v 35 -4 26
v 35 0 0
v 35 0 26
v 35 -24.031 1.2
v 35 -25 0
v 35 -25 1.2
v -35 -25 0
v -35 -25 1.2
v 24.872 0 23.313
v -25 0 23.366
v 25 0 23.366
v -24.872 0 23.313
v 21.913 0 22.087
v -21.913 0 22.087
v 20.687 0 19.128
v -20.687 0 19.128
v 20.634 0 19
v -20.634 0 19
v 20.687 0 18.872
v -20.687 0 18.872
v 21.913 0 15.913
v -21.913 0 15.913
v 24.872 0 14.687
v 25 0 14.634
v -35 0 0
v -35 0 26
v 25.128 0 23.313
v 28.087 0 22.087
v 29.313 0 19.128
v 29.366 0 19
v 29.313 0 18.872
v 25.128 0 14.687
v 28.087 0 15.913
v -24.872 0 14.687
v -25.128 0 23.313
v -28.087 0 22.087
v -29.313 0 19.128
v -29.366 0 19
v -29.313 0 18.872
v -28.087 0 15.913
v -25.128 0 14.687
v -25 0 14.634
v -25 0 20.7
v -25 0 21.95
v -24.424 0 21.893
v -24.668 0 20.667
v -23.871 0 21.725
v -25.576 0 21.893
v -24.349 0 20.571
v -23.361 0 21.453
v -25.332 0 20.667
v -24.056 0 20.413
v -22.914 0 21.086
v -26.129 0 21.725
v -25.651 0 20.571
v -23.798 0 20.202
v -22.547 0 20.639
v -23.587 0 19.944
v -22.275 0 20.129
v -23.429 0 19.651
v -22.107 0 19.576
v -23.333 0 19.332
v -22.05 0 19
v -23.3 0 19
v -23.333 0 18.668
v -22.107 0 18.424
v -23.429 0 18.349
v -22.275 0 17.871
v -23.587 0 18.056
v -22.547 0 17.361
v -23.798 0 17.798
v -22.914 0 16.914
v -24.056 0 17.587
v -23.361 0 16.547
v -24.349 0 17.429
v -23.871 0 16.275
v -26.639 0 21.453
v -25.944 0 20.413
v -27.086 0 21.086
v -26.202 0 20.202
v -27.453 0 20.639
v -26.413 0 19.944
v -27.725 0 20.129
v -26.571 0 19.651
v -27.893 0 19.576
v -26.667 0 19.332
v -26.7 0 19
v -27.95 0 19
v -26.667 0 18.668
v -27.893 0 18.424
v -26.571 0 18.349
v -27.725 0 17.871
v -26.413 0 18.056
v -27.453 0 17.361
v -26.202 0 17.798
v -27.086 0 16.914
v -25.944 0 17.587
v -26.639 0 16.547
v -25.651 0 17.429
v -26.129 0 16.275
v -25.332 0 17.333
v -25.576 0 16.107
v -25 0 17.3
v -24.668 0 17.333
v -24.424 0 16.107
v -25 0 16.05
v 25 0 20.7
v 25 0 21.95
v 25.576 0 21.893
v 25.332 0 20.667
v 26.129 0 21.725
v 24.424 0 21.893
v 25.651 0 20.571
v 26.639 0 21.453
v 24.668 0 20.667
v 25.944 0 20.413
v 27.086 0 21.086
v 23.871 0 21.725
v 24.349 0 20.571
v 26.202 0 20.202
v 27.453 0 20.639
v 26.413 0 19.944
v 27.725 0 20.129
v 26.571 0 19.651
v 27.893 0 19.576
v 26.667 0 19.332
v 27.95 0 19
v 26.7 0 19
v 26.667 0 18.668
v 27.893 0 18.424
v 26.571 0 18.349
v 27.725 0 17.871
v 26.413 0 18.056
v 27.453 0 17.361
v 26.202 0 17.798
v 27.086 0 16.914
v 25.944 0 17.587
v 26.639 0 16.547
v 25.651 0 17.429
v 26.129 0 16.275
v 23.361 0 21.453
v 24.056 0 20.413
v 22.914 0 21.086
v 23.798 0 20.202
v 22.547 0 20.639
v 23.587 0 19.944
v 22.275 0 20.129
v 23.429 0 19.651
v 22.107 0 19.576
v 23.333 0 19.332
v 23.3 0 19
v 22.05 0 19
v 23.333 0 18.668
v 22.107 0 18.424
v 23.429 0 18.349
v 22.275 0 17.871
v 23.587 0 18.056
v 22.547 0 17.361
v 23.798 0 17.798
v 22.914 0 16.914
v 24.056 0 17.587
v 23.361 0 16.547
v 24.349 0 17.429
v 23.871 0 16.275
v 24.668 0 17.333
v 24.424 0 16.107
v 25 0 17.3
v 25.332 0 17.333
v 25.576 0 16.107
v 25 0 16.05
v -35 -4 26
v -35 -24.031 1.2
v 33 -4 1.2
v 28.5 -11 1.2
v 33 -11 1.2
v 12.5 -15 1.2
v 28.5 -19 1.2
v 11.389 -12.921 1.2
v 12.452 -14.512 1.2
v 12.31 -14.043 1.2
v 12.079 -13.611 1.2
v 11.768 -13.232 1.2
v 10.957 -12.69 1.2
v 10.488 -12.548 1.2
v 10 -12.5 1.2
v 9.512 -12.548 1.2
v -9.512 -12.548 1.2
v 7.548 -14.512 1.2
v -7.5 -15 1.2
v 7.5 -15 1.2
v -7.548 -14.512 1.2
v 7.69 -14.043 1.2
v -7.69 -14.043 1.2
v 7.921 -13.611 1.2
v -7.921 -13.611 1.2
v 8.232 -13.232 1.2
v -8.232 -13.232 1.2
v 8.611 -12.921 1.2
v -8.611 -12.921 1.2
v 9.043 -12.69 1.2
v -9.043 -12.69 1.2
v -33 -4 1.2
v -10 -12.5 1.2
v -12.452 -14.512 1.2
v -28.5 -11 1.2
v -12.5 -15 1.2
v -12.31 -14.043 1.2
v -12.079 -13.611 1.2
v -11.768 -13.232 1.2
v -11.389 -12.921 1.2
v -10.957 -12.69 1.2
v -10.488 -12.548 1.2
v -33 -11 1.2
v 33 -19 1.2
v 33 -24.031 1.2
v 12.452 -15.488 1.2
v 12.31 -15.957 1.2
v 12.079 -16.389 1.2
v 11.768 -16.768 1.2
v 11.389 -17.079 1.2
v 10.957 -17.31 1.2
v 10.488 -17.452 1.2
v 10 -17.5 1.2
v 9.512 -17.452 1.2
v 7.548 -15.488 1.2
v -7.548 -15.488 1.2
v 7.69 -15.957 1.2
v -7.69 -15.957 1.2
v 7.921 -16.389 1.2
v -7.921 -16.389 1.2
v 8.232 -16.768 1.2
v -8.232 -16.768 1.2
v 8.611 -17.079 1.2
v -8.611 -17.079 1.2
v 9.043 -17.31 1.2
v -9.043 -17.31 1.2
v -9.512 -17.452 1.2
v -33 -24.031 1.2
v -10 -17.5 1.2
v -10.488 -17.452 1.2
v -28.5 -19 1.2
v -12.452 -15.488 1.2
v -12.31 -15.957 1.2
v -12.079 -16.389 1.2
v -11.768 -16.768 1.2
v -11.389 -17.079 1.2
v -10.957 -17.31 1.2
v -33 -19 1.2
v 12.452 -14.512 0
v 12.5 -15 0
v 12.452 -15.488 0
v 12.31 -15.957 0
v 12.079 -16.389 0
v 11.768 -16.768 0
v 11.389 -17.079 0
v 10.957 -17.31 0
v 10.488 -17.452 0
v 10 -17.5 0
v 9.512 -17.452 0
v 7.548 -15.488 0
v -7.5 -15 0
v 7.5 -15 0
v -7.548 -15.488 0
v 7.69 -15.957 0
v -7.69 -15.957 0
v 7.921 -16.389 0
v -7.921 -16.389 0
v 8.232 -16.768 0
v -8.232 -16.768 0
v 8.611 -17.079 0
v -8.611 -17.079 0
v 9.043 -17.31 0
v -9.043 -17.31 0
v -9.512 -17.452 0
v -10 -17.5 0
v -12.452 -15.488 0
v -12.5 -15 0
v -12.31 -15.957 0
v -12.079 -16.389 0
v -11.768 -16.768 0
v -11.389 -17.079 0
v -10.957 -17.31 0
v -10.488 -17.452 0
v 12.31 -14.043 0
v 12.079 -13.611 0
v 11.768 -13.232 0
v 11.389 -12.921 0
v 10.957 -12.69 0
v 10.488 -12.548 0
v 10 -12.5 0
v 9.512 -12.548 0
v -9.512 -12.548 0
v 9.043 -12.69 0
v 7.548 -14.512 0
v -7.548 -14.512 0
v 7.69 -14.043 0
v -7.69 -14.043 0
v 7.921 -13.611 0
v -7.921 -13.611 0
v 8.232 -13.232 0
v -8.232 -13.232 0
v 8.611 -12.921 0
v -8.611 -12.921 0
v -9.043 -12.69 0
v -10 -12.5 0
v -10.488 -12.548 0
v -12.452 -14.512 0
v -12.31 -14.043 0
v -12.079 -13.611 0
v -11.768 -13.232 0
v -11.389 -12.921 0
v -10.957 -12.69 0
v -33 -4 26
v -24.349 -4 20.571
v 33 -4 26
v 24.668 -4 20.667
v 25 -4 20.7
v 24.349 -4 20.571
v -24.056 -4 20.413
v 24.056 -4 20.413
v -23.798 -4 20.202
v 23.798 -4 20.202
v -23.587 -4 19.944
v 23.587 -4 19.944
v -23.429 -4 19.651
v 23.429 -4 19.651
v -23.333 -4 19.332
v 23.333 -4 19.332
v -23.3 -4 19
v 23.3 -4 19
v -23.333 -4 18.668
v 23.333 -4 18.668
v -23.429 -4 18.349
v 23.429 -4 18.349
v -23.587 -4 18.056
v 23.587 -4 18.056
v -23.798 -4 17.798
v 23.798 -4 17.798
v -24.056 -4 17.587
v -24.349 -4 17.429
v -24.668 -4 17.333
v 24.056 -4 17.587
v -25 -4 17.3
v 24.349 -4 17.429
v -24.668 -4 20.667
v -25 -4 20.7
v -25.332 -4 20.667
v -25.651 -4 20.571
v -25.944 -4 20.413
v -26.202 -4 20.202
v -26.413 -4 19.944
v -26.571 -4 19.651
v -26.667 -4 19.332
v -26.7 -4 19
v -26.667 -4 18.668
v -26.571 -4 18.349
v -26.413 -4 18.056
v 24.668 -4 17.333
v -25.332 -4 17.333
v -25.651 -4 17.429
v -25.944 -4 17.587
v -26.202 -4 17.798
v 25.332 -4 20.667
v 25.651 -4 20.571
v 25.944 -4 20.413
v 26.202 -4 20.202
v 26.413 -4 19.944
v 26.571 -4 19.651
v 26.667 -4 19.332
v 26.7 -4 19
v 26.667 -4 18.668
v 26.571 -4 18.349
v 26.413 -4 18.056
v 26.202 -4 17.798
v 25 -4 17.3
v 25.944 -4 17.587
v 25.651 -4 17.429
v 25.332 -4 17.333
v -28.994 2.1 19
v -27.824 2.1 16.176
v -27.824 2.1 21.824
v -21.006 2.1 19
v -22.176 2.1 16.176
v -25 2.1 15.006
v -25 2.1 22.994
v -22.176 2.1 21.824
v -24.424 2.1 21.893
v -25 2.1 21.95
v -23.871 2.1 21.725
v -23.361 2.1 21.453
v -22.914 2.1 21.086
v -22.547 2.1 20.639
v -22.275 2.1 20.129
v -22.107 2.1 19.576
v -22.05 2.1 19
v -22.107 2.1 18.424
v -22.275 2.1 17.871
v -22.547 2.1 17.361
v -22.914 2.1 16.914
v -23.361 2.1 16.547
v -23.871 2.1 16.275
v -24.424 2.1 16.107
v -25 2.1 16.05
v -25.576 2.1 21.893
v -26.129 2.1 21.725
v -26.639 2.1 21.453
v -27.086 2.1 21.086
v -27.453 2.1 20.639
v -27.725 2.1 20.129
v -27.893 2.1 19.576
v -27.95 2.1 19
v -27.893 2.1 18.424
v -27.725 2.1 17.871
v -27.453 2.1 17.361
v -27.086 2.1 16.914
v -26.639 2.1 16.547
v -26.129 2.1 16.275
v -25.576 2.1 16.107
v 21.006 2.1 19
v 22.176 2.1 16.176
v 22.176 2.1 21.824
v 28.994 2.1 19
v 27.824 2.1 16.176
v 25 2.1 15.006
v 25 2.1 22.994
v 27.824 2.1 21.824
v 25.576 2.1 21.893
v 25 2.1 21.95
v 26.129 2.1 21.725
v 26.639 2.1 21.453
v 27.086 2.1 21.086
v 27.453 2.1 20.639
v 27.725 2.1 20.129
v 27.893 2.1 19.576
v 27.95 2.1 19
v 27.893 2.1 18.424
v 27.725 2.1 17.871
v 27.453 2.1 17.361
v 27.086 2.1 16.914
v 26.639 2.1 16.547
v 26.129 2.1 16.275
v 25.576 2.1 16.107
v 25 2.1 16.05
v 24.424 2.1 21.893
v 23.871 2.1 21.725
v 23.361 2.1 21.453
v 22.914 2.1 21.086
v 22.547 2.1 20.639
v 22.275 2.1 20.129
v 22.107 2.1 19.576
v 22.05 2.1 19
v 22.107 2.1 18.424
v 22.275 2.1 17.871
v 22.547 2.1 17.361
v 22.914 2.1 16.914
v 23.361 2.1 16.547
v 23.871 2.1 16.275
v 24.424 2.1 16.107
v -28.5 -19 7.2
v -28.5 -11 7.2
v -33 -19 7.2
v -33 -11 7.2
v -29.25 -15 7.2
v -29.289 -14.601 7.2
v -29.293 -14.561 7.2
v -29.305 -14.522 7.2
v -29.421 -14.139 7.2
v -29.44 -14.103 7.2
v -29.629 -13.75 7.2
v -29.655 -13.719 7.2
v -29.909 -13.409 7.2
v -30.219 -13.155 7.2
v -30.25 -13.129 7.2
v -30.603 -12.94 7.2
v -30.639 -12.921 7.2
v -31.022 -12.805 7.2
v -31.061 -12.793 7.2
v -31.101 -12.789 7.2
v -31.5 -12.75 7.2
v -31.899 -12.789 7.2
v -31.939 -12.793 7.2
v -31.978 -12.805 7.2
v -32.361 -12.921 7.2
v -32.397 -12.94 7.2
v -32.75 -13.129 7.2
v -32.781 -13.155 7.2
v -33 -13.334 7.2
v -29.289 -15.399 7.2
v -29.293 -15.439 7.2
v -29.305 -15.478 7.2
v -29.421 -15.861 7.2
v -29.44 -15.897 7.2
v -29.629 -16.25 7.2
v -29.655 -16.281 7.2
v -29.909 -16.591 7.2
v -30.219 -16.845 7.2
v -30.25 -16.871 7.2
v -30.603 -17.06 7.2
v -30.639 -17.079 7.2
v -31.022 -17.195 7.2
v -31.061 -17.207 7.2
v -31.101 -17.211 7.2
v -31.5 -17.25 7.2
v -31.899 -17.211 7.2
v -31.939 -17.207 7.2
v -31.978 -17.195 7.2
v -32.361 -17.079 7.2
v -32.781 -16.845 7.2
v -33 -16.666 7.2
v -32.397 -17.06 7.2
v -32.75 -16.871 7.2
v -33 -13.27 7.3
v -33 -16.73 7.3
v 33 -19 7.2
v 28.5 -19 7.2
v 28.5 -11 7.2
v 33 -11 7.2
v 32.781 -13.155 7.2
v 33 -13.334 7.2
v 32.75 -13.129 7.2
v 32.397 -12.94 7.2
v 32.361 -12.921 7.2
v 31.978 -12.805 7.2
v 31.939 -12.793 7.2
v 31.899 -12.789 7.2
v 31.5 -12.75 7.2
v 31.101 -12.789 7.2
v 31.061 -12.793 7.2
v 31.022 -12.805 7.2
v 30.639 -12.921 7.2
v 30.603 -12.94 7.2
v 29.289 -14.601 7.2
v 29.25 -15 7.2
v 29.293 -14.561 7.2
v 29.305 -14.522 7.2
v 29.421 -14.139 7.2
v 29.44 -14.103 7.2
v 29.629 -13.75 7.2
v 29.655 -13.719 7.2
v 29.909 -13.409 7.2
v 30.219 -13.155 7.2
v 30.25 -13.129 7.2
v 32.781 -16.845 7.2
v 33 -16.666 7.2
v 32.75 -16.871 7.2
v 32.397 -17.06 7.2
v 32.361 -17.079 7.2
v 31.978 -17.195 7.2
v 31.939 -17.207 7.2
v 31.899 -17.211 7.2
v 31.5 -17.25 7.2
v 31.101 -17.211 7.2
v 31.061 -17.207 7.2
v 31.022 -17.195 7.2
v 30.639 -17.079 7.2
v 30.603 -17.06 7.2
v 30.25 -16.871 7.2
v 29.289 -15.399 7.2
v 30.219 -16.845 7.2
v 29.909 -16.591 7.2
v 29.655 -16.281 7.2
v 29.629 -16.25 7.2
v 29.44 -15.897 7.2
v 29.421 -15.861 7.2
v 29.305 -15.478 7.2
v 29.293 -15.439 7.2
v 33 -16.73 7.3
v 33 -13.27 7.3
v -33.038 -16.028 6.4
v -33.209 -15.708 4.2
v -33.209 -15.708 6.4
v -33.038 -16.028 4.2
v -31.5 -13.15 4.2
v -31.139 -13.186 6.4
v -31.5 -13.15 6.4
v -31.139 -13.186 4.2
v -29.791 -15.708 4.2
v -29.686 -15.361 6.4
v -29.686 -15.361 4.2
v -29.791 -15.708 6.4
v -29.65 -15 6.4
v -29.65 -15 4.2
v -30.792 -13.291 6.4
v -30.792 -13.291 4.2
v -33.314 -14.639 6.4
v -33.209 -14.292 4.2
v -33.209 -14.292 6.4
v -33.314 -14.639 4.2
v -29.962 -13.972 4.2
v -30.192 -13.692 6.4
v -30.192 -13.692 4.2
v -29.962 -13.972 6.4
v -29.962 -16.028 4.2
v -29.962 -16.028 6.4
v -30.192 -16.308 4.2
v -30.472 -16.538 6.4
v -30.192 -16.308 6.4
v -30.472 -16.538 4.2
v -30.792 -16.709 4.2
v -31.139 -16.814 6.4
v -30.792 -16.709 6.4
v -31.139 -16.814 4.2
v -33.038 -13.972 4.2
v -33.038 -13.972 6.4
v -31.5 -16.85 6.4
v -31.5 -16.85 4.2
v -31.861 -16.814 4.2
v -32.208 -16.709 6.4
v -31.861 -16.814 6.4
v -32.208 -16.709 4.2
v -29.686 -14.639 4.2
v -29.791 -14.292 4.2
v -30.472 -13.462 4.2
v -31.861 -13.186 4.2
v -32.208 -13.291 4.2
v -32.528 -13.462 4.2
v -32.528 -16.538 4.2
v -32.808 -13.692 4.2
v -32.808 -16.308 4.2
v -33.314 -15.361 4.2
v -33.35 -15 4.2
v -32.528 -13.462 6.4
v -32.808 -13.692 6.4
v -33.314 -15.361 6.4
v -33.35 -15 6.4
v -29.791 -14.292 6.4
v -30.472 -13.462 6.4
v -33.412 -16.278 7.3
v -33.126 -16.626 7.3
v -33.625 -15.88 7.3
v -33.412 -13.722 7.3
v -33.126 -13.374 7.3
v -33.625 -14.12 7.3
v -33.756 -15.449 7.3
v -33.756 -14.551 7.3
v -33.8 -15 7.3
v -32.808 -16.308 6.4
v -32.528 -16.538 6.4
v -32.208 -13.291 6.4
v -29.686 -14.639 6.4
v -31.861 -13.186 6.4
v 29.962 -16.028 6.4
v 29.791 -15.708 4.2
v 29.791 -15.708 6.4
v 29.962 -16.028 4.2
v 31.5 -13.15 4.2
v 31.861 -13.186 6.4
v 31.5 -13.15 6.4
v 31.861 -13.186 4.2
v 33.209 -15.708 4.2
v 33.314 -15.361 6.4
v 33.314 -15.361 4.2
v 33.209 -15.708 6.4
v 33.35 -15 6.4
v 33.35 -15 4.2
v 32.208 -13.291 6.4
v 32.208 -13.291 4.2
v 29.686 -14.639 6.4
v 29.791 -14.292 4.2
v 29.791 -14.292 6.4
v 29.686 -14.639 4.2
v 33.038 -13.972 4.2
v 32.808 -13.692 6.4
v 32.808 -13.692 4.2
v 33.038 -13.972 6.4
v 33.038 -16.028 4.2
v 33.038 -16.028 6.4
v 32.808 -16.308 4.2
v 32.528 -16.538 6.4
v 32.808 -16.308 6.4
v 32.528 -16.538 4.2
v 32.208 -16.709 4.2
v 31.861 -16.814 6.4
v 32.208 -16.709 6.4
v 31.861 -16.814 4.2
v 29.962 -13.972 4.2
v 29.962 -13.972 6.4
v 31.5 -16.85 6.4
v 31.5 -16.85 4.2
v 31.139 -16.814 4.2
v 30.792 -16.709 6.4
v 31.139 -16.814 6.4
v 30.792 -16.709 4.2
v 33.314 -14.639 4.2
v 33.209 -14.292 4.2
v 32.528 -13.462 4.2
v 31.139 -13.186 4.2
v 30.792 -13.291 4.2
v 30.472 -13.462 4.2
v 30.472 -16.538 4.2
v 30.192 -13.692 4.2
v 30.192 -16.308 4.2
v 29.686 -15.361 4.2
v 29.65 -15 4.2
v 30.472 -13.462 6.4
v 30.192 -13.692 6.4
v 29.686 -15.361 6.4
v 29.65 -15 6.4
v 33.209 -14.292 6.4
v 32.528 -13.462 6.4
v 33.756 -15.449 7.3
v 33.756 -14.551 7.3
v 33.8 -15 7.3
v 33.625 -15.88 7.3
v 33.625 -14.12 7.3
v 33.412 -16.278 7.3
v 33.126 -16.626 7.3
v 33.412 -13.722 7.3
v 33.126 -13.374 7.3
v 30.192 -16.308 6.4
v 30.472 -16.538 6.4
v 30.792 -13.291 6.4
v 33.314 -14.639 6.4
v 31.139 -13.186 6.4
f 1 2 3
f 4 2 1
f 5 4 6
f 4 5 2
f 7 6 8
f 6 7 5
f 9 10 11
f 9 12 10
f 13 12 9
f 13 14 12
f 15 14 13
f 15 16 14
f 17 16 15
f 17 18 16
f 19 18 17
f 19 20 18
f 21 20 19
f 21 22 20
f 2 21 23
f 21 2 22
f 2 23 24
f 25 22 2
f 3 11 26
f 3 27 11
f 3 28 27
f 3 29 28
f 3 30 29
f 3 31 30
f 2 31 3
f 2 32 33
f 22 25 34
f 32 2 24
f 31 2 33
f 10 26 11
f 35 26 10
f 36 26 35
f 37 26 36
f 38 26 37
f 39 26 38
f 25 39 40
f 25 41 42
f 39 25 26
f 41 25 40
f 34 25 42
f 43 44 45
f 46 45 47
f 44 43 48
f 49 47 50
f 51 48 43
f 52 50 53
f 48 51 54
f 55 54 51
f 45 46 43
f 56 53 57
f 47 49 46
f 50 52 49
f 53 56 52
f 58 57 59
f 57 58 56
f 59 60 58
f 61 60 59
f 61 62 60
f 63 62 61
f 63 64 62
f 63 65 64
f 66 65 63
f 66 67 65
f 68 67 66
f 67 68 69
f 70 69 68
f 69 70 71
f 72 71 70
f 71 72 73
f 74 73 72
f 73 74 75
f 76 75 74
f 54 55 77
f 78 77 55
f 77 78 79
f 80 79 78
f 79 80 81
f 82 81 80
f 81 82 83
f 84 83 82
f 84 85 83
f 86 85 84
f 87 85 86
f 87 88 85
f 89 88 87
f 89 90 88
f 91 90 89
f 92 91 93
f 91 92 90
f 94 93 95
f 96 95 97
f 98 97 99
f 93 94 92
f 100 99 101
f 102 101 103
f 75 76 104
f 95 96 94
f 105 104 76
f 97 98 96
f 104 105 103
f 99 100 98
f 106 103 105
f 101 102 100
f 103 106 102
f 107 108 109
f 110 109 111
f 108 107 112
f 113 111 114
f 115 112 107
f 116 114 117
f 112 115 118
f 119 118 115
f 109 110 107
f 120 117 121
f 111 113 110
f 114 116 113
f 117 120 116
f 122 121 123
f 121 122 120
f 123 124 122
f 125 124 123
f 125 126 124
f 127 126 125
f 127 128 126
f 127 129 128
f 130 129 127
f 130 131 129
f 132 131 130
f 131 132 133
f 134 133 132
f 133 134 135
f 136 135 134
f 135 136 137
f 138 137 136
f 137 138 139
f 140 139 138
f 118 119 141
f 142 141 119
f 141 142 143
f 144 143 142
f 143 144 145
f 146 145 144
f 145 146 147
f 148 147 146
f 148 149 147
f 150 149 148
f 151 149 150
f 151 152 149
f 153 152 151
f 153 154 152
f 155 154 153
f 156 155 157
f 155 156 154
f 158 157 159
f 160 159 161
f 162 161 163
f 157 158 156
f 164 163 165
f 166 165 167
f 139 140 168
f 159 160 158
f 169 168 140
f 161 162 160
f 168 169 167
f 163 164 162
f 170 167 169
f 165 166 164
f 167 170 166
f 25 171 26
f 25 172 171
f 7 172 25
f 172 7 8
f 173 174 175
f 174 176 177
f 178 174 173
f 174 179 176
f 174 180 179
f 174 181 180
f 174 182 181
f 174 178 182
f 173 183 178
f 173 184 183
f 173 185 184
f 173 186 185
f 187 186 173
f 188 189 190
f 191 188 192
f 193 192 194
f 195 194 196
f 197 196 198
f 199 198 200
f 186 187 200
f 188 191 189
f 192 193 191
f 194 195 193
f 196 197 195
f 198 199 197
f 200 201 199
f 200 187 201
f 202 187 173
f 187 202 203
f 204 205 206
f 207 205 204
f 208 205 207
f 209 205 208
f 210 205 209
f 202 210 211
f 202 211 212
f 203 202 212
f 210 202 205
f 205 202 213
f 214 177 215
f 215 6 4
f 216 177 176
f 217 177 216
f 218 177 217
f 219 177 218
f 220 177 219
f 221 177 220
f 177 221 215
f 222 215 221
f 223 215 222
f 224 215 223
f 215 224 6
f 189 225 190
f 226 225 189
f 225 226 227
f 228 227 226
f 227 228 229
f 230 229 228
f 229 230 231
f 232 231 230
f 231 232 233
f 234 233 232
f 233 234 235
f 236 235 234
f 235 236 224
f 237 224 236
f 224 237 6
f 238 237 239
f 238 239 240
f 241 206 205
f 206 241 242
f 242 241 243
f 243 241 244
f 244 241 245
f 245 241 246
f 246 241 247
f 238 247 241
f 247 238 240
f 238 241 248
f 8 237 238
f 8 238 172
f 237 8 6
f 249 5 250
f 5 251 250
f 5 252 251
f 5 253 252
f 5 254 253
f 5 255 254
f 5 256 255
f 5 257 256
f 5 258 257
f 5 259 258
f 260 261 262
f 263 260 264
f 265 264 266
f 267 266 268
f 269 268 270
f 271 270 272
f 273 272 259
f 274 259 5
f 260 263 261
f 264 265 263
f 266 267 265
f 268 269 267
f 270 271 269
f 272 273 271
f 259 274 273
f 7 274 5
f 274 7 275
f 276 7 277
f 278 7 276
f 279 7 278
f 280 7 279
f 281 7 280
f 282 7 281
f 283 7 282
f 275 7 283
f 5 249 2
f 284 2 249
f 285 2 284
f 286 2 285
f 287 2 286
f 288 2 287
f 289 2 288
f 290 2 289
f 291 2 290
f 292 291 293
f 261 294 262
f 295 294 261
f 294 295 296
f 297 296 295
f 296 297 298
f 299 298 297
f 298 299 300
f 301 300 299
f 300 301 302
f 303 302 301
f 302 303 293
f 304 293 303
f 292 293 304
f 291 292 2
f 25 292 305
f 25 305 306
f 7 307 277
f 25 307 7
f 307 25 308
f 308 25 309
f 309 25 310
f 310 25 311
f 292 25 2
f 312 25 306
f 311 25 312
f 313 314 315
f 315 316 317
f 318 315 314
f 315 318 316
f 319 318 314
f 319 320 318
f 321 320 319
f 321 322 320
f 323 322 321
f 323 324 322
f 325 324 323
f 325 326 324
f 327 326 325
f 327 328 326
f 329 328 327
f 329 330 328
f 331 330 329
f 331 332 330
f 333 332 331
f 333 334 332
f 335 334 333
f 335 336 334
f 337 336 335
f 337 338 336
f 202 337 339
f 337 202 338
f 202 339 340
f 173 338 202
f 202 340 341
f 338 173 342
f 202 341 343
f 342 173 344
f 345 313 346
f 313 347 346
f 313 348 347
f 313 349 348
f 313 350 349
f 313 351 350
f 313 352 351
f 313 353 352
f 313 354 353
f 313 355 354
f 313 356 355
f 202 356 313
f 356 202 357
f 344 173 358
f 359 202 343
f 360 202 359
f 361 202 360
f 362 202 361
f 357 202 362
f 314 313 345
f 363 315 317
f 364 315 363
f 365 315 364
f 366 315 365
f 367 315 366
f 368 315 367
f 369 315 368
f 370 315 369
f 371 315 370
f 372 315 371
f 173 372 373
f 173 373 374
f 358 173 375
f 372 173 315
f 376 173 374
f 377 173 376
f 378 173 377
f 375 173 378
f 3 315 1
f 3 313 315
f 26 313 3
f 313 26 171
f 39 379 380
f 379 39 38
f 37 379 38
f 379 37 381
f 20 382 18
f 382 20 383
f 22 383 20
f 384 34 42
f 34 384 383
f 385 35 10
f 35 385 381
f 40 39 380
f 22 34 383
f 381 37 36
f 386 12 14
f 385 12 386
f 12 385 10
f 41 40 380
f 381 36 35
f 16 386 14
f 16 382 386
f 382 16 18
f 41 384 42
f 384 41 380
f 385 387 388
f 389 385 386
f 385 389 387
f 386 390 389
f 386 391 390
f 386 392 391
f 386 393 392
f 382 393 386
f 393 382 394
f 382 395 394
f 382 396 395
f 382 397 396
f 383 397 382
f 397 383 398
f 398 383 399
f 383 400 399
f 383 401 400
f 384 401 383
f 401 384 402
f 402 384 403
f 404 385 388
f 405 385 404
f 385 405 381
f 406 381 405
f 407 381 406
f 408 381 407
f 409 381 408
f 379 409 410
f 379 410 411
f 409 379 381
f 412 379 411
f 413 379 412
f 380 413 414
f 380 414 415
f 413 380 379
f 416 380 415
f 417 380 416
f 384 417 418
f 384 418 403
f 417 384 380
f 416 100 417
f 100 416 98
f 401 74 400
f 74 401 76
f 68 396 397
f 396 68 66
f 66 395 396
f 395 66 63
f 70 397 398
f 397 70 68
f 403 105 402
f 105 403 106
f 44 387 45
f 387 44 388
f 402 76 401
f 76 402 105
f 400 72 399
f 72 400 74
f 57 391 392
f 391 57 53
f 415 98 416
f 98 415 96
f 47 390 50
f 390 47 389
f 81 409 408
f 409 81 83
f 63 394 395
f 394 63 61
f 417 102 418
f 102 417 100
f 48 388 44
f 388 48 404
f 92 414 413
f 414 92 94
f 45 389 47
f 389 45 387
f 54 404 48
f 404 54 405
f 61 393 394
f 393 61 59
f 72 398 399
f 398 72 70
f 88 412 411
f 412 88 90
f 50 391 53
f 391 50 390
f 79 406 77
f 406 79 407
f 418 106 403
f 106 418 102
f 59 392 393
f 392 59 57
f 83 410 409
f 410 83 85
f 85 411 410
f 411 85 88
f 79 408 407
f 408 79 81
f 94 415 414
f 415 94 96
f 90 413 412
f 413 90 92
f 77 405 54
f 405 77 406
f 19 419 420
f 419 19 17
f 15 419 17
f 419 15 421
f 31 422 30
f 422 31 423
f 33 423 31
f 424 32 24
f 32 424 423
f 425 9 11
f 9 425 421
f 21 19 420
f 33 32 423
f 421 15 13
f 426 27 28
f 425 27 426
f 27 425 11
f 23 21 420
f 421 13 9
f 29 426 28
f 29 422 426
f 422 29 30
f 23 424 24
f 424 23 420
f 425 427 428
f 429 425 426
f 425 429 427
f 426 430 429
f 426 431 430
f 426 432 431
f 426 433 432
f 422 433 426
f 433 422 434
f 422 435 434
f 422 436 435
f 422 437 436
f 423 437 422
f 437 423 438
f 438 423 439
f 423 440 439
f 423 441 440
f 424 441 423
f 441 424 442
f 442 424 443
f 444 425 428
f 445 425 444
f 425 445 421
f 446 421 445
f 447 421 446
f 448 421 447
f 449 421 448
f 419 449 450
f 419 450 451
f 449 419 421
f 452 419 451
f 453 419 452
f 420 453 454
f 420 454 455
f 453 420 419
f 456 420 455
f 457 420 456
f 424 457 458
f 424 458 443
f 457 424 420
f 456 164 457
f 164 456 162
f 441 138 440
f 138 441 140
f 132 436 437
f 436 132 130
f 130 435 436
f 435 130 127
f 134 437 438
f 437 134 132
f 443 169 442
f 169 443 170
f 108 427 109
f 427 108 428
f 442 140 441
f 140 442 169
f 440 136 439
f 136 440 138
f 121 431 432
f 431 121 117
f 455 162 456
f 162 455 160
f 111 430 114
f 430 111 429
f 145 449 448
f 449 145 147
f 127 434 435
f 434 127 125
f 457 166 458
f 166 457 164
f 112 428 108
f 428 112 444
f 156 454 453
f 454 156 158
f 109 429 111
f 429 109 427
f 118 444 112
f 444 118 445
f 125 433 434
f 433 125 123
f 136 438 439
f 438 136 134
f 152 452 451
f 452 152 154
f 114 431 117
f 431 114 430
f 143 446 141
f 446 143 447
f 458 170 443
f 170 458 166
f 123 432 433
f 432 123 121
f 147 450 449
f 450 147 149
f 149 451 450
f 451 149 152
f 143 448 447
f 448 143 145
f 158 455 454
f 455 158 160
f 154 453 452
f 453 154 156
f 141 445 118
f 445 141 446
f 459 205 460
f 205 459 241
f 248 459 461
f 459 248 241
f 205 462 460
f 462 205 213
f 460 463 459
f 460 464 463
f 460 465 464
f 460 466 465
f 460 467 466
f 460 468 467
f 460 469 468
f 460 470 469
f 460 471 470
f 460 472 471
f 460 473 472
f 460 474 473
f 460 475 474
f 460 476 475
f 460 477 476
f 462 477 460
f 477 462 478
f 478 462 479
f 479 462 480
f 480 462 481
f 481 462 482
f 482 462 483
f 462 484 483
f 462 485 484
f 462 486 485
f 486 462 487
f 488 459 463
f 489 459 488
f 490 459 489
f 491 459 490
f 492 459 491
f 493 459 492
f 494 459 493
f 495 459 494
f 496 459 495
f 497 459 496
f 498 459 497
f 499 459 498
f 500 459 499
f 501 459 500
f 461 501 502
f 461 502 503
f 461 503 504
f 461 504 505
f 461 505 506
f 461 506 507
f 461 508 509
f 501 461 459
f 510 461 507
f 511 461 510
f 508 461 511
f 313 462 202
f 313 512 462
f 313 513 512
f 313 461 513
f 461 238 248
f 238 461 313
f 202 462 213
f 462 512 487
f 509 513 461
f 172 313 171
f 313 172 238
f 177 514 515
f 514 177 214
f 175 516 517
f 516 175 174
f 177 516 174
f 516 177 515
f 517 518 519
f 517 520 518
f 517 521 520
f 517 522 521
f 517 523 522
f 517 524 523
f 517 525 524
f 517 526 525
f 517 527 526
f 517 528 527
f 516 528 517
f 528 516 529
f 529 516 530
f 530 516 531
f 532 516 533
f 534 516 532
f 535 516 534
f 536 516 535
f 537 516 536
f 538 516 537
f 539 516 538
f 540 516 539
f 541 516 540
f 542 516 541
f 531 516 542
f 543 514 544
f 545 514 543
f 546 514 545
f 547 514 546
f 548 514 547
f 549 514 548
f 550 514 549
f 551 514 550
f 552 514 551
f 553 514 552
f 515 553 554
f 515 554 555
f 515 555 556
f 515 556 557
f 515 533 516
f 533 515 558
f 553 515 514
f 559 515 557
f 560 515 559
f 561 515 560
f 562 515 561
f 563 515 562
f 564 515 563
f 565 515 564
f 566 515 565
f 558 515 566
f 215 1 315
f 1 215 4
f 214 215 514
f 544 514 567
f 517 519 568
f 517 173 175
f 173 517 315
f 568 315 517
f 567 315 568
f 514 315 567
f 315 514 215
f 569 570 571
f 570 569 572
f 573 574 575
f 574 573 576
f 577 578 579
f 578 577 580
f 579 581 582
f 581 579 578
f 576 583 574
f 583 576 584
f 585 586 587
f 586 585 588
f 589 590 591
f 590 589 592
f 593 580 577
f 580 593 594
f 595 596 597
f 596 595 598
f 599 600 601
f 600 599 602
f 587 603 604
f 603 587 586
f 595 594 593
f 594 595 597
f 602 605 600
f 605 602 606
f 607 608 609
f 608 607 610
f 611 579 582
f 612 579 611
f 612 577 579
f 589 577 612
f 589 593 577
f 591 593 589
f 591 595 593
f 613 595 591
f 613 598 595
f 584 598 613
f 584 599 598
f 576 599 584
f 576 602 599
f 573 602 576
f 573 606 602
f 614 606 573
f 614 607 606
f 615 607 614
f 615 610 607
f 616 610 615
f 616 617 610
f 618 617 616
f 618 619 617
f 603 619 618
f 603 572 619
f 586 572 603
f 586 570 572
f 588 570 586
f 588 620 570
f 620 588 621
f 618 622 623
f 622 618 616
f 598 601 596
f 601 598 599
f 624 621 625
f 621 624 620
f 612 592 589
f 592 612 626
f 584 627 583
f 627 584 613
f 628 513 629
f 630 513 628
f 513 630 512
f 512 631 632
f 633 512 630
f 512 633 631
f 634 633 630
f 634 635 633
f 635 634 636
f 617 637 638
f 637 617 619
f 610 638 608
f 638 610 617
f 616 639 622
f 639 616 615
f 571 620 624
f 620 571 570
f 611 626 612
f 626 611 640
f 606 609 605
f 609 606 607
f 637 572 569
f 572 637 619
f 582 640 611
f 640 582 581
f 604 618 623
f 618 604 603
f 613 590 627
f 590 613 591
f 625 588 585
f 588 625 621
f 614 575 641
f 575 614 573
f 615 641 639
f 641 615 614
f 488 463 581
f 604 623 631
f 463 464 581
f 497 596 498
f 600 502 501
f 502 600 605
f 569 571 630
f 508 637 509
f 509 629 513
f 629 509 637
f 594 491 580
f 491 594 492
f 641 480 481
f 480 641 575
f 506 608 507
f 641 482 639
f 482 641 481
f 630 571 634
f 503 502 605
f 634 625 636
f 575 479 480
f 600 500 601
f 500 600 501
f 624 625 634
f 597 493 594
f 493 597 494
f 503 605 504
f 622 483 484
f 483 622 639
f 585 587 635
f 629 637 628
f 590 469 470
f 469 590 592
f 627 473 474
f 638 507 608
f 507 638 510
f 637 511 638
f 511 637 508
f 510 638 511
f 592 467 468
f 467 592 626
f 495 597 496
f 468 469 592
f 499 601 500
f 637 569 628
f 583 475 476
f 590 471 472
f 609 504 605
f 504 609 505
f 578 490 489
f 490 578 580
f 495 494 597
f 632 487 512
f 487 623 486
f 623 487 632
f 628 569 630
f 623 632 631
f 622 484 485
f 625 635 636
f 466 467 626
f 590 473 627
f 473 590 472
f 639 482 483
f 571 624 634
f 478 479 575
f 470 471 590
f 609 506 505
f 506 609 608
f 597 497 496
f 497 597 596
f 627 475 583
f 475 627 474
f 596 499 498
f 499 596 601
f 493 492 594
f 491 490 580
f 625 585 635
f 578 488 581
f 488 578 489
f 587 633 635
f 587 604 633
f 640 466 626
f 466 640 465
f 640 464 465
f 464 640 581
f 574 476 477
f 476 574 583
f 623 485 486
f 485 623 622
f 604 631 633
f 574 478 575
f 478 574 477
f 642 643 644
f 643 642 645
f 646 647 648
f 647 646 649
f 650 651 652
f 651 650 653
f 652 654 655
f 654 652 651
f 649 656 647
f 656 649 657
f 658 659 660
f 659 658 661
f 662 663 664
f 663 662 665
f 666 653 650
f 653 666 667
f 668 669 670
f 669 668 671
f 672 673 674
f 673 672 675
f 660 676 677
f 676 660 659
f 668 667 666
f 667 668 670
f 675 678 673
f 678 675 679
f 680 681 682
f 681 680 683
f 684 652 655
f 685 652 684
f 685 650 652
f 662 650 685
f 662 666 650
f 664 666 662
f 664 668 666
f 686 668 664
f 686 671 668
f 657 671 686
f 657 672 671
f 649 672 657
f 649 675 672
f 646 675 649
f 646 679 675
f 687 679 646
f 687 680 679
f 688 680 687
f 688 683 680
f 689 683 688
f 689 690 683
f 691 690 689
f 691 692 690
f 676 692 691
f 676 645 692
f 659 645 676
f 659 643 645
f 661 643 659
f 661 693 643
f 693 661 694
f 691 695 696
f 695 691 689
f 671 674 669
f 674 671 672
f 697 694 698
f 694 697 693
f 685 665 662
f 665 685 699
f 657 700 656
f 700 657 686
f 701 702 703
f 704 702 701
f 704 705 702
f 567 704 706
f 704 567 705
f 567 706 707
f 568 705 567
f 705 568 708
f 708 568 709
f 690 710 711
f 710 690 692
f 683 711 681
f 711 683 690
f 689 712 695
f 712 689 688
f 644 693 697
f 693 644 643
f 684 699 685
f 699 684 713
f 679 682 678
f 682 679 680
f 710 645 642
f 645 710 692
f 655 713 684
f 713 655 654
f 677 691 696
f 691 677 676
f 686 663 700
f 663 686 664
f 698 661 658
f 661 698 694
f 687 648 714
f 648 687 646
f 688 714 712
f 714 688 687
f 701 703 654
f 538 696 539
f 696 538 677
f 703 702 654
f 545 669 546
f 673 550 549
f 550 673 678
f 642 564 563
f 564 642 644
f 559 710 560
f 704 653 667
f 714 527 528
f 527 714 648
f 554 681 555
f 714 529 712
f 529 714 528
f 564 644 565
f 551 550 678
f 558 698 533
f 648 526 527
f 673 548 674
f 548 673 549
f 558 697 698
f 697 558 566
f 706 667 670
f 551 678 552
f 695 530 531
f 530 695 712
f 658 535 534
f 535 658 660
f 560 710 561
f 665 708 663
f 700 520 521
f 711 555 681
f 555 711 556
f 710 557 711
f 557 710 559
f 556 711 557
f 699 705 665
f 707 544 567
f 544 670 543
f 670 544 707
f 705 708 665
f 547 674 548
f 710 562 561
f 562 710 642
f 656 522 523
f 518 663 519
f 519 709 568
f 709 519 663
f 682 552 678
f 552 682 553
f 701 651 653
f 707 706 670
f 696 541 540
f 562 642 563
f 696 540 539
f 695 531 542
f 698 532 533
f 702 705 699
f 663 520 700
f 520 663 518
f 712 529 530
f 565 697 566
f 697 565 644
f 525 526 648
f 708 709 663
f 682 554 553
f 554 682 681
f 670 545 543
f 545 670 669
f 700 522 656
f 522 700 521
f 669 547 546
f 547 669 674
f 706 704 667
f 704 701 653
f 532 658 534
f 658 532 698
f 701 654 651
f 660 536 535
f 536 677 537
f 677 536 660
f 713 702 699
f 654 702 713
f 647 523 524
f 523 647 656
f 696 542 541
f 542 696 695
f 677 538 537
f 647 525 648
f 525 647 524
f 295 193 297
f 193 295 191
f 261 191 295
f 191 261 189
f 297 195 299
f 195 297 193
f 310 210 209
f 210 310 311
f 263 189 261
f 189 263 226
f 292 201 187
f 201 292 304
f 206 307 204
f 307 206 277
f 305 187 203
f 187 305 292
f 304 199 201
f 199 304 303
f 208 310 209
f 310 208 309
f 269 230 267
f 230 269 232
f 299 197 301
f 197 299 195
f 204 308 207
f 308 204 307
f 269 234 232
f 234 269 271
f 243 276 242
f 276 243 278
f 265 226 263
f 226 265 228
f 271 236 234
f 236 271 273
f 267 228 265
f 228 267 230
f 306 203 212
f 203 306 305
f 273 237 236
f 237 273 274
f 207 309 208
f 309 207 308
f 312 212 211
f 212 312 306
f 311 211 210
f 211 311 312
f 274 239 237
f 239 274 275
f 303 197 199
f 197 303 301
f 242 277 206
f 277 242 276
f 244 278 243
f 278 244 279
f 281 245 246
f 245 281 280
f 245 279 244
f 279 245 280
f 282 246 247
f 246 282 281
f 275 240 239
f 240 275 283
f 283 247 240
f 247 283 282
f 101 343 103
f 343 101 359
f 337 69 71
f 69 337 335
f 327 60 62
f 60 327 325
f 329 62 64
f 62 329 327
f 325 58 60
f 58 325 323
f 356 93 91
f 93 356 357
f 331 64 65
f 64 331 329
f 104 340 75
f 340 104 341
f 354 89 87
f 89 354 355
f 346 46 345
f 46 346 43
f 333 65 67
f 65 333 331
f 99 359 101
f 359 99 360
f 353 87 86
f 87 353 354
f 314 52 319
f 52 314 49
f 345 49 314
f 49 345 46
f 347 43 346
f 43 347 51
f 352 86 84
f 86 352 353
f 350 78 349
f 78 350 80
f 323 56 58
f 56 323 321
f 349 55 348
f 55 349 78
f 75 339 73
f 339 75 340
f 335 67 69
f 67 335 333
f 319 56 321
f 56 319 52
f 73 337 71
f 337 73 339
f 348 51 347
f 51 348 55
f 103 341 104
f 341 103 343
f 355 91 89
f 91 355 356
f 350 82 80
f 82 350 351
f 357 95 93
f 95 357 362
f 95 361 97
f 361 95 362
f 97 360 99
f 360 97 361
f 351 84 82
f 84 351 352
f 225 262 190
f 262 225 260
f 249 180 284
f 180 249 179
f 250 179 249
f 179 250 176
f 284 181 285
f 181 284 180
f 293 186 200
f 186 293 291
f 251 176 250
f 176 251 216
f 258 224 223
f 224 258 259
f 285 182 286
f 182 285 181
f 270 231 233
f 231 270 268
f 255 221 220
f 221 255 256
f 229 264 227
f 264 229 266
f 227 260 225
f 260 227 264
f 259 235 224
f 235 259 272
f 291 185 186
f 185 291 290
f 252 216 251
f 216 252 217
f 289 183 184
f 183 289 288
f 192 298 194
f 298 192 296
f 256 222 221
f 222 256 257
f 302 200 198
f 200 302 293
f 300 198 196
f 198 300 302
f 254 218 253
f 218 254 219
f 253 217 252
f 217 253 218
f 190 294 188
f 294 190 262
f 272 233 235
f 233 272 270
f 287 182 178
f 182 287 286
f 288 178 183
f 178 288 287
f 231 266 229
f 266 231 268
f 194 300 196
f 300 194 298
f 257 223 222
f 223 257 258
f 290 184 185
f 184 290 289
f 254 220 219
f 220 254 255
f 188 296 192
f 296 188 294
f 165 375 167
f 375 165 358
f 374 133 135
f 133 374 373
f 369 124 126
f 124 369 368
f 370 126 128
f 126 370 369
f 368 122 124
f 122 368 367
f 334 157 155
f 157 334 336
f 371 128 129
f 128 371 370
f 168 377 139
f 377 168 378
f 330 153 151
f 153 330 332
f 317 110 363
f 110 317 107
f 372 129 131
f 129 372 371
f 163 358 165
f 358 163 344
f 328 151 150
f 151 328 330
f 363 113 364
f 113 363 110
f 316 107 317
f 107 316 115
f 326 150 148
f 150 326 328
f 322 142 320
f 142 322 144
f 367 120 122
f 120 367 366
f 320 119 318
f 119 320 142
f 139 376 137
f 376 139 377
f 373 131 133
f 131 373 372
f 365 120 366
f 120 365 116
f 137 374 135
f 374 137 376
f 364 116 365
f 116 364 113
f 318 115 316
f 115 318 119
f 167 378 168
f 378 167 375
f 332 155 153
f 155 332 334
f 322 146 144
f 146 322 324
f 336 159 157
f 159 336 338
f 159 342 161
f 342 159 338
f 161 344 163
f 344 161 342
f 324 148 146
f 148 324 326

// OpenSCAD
include <../lib/robotskin.scad>

// Flat contact face on bed; pegs are horizontal.
rotate([90,0,0]) pogo_pin_mount();
